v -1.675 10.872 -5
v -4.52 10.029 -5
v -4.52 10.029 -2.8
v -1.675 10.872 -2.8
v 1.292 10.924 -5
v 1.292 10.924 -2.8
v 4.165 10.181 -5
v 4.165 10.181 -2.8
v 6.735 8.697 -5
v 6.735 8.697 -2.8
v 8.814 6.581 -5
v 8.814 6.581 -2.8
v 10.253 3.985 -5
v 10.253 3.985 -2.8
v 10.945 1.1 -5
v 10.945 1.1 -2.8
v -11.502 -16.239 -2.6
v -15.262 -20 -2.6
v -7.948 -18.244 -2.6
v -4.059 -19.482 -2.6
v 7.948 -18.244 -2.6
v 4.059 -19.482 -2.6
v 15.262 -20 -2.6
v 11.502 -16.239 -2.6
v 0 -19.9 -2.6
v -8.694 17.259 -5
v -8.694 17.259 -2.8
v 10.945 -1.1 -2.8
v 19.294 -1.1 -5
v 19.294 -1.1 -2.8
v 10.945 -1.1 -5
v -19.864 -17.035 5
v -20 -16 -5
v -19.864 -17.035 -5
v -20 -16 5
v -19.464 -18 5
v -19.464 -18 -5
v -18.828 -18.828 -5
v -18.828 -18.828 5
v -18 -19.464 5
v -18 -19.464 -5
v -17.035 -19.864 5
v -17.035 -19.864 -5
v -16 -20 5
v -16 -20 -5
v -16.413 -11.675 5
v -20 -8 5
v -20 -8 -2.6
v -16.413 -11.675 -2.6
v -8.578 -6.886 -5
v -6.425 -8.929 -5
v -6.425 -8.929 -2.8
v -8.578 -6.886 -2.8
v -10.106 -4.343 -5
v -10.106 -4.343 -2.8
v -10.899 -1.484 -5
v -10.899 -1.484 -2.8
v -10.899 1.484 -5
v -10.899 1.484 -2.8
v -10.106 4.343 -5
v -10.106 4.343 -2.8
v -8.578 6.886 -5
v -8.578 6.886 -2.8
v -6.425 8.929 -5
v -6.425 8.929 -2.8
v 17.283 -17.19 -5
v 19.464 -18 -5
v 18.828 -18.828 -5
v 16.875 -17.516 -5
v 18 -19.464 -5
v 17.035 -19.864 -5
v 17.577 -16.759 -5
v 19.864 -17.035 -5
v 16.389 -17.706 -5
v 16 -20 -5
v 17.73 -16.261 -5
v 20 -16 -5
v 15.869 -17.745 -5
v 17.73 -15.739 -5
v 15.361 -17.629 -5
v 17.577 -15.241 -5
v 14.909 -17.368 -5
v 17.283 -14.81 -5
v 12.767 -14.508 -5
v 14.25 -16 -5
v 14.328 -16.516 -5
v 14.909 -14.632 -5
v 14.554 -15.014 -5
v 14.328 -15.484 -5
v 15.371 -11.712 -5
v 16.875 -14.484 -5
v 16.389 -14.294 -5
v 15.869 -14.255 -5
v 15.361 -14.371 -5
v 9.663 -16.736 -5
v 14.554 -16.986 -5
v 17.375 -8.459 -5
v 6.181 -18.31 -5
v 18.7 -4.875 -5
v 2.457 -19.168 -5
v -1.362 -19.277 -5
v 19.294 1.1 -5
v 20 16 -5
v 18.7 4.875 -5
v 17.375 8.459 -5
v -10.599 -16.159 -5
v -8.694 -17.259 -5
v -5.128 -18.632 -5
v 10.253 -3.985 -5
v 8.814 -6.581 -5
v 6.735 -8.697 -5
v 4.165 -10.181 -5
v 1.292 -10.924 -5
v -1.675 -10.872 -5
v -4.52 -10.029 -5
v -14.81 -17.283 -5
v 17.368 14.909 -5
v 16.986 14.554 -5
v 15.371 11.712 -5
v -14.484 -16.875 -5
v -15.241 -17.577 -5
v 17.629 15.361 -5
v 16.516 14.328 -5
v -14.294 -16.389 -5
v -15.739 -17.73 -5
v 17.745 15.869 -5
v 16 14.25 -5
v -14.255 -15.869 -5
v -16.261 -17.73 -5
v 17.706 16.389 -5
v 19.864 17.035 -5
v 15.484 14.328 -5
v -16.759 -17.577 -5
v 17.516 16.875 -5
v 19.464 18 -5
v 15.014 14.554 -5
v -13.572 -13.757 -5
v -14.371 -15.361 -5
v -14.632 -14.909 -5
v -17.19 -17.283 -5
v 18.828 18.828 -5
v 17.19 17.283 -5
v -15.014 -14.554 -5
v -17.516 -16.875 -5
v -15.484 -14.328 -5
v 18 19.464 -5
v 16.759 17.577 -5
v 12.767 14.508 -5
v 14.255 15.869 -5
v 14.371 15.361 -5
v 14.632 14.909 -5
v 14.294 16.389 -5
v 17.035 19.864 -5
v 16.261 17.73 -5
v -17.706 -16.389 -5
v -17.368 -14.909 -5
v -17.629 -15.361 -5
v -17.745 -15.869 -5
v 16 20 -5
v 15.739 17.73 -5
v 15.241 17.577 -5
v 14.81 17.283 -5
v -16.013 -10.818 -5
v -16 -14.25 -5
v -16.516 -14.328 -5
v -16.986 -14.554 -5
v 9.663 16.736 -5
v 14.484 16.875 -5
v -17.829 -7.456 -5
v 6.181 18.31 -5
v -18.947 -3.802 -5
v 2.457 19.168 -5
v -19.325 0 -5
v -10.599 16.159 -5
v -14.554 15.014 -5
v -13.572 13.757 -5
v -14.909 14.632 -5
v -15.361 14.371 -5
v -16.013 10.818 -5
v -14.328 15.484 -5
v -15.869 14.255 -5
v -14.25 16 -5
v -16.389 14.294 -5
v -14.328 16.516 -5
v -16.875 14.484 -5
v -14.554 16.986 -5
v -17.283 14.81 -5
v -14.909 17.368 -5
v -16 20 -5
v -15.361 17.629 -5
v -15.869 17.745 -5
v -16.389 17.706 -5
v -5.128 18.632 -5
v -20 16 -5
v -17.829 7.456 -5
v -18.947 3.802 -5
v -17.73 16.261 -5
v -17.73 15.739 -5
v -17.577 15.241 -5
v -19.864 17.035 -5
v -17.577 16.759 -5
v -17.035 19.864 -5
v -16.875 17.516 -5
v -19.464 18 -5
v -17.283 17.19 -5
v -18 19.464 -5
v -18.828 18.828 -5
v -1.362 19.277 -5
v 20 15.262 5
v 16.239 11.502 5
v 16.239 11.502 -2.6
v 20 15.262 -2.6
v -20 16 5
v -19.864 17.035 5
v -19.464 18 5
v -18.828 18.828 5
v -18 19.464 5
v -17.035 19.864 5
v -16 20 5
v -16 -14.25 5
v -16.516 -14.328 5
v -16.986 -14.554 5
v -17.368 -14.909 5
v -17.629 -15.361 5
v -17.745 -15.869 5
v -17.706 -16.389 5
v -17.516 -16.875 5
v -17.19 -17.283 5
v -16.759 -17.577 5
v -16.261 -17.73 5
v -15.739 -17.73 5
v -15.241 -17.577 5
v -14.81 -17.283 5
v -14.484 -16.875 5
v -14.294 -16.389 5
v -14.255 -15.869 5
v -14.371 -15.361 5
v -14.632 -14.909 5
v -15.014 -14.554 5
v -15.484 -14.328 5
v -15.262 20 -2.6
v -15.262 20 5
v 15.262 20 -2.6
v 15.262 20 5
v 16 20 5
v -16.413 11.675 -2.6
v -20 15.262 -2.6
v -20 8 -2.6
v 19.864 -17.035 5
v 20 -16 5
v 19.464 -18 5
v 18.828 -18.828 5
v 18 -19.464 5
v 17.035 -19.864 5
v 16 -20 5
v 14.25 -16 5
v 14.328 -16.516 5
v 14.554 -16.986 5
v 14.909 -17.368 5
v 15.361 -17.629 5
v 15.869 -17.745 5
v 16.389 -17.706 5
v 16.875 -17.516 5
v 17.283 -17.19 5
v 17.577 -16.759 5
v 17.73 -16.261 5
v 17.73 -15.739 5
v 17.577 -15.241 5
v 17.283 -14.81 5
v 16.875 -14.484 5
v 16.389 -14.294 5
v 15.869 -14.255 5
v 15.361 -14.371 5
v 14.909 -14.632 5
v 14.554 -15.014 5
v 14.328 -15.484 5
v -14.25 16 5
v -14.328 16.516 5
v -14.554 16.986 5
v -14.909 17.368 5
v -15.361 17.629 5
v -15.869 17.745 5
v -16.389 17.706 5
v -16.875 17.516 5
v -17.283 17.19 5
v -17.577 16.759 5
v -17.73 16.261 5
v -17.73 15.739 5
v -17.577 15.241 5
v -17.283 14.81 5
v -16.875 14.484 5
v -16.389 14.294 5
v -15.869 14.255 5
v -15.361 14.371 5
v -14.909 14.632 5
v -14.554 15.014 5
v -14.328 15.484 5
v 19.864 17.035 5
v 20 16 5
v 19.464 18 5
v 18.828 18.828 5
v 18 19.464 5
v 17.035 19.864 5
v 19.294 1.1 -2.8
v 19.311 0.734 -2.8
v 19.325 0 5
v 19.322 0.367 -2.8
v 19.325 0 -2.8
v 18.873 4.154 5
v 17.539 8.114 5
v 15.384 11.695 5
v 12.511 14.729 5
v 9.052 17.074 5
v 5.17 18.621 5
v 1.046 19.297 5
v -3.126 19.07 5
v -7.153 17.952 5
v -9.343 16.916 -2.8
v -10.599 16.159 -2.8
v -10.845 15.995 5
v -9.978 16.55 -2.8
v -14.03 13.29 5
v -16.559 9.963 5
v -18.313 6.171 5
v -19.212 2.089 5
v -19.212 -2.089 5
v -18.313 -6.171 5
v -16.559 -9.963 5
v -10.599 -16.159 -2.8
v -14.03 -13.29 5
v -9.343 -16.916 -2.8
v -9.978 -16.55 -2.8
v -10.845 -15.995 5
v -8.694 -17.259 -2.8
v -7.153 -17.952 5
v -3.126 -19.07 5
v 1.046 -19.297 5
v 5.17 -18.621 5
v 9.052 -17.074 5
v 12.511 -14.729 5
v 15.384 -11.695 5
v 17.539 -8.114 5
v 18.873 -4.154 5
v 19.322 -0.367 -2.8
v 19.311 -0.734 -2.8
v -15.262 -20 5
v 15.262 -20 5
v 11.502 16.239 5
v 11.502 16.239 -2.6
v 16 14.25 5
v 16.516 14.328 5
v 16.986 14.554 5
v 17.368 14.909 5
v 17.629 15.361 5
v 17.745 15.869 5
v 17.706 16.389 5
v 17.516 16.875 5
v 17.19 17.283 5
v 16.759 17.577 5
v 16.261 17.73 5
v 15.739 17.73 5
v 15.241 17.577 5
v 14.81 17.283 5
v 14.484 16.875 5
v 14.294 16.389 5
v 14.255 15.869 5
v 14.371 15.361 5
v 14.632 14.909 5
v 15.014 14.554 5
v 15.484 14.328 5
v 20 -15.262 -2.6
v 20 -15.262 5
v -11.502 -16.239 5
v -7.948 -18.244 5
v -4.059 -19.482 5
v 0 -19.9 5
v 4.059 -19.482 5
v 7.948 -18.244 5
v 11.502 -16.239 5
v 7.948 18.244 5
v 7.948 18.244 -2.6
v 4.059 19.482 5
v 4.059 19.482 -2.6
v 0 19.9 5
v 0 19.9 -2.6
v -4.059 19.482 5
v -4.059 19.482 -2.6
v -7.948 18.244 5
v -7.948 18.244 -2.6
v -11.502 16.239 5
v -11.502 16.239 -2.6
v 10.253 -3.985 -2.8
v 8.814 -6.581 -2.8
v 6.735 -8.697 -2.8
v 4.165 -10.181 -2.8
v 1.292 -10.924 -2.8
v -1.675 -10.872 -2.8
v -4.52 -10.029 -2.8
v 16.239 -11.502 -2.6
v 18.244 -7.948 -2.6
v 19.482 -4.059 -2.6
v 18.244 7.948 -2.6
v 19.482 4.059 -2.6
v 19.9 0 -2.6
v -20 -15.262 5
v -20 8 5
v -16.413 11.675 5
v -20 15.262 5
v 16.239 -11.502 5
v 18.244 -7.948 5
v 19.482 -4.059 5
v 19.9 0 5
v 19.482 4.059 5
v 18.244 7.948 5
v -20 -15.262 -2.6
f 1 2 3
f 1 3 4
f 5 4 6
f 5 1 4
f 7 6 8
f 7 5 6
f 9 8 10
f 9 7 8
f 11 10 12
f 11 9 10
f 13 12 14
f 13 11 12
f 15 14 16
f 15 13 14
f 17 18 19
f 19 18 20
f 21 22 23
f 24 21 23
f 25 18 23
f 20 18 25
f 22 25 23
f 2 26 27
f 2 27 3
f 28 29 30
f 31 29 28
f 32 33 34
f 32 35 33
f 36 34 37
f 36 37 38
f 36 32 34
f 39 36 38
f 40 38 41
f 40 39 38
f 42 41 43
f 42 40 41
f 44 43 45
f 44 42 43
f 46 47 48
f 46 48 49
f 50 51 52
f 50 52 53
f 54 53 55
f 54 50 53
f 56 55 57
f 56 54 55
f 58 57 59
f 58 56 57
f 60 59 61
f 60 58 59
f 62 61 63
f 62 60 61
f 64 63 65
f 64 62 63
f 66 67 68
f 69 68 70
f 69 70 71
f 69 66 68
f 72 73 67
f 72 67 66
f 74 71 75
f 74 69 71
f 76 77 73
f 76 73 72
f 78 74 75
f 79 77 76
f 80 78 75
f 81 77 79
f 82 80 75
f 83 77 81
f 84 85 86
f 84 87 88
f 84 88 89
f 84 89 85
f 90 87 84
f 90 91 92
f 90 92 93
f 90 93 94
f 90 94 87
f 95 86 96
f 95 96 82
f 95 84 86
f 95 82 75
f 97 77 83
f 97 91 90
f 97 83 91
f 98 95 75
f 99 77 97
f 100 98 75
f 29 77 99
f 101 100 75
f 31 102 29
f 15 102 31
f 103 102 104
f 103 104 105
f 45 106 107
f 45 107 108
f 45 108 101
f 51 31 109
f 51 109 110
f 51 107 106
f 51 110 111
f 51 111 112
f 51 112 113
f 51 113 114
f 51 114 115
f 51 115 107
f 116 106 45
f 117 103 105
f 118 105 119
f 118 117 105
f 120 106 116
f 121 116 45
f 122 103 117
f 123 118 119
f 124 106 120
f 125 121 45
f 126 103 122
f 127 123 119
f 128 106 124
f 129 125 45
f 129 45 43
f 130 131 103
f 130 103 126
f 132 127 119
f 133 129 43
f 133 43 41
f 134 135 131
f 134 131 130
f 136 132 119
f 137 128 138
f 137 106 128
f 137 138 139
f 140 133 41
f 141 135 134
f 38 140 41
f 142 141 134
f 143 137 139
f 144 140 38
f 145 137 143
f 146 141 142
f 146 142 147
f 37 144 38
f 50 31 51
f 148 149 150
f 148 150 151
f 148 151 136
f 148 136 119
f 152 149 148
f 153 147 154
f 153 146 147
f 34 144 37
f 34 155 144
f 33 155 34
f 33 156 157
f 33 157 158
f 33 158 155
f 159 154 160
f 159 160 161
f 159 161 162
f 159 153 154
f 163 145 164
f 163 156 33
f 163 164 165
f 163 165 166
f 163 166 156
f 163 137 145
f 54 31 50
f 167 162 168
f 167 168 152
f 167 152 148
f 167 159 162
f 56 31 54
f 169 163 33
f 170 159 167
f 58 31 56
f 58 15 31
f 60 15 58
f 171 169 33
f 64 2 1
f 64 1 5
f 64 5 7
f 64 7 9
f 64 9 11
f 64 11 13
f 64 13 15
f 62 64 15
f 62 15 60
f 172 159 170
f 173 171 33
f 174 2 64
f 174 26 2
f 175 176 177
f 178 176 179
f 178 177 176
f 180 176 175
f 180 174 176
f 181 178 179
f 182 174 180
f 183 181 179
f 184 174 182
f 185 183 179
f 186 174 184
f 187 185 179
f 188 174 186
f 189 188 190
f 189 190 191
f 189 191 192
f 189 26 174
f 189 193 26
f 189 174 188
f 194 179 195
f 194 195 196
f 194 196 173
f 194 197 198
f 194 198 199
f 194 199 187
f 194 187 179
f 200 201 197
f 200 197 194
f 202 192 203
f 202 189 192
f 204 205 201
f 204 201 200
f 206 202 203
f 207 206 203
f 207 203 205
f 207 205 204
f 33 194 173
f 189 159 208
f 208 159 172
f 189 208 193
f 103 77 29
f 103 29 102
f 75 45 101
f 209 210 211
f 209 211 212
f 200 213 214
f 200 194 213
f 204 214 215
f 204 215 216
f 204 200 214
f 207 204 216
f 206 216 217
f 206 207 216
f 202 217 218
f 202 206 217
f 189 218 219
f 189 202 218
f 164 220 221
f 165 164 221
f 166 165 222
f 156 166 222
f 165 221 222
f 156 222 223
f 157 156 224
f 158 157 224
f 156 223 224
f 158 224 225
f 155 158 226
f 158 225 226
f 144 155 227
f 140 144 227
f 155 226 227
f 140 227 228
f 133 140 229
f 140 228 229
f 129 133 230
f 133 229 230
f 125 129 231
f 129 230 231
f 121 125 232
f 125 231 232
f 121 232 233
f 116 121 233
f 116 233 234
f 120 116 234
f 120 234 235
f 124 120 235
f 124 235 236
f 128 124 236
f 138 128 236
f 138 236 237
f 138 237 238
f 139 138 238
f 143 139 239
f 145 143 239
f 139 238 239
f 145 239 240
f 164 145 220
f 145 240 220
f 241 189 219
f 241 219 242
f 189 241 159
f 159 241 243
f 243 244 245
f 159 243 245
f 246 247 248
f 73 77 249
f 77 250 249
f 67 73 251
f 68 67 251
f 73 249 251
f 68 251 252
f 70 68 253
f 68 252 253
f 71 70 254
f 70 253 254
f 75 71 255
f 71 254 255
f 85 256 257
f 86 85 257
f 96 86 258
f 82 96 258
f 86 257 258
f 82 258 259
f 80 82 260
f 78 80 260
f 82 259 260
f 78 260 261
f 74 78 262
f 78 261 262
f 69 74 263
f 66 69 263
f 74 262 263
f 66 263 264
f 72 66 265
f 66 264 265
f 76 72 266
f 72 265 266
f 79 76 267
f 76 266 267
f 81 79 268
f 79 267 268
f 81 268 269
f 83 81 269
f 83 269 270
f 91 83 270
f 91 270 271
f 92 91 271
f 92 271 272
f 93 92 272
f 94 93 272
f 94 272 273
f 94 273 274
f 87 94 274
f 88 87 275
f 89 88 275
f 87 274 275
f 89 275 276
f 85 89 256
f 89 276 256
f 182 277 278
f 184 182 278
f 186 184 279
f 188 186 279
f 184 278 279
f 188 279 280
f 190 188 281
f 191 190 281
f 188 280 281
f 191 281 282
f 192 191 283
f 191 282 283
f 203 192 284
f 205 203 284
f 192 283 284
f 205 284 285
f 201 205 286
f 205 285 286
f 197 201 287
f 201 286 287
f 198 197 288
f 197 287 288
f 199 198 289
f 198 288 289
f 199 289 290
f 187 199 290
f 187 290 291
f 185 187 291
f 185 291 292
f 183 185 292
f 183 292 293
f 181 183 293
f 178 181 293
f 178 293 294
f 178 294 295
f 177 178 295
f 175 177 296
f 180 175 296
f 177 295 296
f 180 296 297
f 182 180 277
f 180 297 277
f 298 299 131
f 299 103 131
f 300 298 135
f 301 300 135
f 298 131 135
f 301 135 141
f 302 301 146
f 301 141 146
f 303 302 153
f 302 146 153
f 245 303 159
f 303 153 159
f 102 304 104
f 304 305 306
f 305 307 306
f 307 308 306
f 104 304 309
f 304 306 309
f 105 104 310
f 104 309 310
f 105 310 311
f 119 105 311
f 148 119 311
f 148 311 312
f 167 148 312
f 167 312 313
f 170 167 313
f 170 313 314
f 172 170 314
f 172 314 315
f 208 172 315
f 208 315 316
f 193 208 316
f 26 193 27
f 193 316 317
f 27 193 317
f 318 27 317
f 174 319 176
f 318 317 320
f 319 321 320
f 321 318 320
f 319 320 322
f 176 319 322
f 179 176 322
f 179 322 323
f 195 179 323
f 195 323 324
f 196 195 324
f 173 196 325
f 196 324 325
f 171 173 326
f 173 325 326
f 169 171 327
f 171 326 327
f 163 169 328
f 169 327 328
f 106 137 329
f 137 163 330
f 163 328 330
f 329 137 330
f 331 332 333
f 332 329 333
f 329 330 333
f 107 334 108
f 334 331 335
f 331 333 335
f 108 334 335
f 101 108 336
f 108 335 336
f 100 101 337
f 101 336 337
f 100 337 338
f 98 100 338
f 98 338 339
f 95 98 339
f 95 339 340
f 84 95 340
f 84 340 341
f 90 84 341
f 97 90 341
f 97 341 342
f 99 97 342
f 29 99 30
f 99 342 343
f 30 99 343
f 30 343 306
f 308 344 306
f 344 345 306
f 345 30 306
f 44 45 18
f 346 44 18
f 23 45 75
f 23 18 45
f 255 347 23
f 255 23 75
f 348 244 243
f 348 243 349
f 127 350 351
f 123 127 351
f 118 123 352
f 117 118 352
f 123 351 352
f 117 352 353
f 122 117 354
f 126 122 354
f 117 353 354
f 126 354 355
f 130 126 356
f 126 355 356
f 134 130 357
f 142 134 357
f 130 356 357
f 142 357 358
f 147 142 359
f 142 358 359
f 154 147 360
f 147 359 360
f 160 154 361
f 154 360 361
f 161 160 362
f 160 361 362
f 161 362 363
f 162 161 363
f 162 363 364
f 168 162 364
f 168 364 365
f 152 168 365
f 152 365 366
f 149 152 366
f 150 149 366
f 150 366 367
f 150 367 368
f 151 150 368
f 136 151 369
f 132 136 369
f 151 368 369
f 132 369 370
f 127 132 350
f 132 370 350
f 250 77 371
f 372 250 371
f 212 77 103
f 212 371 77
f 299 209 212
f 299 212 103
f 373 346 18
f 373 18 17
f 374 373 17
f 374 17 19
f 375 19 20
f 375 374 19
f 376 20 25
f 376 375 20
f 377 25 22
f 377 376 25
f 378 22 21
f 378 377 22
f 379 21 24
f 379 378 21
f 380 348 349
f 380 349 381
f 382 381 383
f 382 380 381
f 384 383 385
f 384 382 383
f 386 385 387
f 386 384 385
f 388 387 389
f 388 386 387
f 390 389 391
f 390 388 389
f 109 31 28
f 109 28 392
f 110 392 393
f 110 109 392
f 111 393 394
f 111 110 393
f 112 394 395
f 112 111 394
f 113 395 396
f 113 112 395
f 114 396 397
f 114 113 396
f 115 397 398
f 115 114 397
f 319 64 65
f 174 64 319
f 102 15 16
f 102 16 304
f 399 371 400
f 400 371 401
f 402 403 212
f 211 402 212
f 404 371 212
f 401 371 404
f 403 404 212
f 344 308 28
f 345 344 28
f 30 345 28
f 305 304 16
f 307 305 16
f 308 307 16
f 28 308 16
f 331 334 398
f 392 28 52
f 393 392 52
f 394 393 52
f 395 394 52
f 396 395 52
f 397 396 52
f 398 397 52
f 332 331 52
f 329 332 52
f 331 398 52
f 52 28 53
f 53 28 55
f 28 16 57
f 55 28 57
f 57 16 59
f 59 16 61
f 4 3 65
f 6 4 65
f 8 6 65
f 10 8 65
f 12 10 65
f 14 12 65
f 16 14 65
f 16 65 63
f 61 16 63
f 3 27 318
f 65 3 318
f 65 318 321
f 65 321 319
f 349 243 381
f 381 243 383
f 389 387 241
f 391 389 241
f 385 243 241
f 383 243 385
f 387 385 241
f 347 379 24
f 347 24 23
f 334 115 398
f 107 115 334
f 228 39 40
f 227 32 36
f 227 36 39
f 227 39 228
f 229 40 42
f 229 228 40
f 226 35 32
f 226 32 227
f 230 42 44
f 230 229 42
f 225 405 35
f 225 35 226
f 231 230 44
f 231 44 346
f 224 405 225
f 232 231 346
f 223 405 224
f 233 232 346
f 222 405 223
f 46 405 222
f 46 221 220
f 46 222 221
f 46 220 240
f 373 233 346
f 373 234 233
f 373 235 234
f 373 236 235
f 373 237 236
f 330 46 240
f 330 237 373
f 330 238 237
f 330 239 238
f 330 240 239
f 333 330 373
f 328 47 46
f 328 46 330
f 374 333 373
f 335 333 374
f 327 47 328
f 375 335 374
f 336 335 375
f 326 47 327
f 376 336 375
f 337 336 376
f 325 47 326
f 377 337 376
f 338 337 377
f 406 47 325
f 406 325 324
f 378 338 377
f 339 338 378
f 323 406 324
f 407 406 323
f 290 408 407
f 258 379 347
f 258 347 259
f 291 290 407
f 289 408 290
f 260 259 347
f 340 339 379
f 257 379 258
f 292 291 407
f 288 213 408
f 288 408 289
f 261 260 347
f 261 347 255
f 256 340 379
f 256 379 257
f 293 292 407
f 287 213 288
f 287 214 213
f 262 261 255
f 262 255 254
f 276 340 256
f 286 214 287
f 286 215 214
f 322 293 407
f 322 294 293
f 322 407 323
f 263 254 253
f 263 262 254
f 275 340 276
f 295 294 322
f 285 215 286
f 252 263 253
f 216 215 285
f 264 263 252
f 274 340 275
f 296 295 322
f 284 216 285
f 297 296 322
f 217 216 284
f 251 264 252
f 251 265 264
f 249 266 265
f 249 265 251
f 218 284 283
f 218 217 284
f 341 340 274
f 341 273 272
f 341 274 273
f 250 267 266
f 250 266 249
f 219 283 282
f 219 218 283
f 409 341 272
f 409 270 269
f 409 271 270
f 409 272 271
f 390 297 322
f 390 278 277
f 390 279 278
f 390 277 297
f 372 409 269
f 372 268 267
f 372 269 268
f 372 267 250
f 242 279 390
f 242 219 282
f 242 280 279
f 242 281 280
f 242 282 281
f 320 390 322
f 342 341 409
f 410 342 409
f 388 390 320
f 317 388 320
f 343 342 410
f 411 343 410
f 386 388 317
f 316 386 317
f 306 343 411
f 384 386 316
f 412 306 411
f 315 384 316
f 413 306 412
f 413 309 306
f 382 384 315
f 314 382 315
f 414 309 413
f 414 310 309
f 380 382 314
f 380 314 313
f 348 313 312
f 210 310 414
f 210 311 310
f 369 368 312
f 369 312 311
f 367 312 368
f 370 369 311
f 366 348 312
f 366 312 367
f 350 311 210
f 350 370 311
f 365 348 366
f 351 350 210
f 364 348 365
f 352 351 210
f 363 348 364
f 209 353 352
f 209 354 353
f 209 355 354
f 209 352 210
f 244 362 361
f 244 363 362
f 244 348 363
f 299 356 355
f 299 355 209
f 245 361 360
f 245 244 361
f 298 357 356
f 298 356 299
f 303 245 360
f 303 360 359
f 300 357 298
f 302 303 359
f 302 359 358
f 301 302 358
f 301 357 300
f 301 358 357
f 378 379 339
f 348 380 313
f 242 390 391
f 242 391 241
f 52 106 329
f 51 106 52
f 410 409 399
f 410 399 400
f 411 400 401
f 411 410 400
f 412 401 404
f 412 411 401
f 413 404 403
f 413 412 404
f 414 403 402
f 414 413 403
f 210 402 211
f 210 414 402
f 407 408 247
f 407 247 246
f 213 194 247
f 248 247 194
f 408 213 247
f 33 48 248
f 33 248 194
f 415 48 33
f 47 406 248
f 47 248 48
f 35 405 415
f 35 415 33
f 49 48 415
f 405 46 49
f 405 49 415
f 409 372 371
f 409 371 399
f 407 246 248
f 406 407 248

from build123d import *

# Parameters (mm, degrees)
SKETCH21_W          = 40
SKETCH21_H          = 40
BOSS_EXTRUDE4_DEPTH = 5
FILLET3_R           = 4
SKETCH22_R          = 19.325
CUT_EXTRUDE11_DEPTH = 11
CUT_EXTRUDE12_DEPTH = 7.6
SKETCH30_R          = 1.75
CUT_EXTRUDE13_DEPTH = 10
CIRPATTERN2_COUNT   = 4
BOSS_EXTRUDE3_DEPTH = 2.2
BOSS_EXTRUDE5_REACH = 12


with BuildPart() as part:
    # Sketch21 → Boss-Extrude4 (new body, symmetric)
    with BuildSketch(Plane.XY):
        Rectangle(SKETCH21_W, SKETCH21_H)
    extrude(amount=BOSS_EXTRUDE4_DEPTH, both=True)

    # Fillet3
    fillet3_edges = [part.edges().sort_by_distance(p)[0] for p in [
        (20, -20, 0),
        (-20, -20, 0),
        (-20, 20, 0),
        (20, 20, 0),
    ]]
    fillet(fillet3_edges, radius=FILLET3_R)

    # Sketch22 → Cut-Extrude11 (cut, through all)
    with BuildSketch(Plane.XY.offset(5)):
        Circle(SKETCH22_R)
    extrude(amount=-CUT_EXTRUDE11_DEPTH, mode=Mode.SUBTRACT)

    # Sketch23 → Cut-Extrude12 (cut)
    with BuildSketch(Plane.XY.offset(5)):
        with BuildLine():
            Line((15.262384566, 20), (11.501799696, 16.23941513))
            ThreePointArc((11.501799696, 16.23941513), (0, 19.9), (-11.501799696, 16.23941513))
            Line((-11.501799696, 16.23941513), (-15.262384566, 20))
            Line((-15.262384566, 20), (15.262384566, 20))
        make_face()
    cut_extrude12 = extrude(amount=-CUT_EXTRUDE12_DEPTH, mode=Mode.SUBTRACT)

    # Sketch30 → Cut-Extrude13 (cut)
    with BuildSketch(Plane.XY.offset(5)):
        with Locations((-16, 16)):
            Circle(SKETCH30_R)
    cut_extrude13 = extrude(amount=-CUT_EXTRUDE13_DEPTH, mode=Mode.SUBTRACT)

    # CirPattern2: Cut-Extrude12, Cut-Extrude13 ×4 about axis
    cirpattern2_axis = Axis((0, 0, 0), (0, 0, 1))
    for i in range(1, CIRPATTERN2_COUNT):
        add(cut_extrude12.rotate(cirpattern2_axis, i * 360 / CIRPATTERN2_COUNT), mode=Mode.SUBTRACT)
        add(cut_extrude13.rotate(cirpattern2_axis, i * 360 / CIRPATTERN2_COUNT), mode=Mode.SUBTRACT)

    # Sketch20 → Boss-Extrude3 (add)
    with BuildSketch(Plane(origin=(0, 0, -5), x_dir=(-1, 0, 0), z_dir=(0, 0, -1))):
        with BuildLine():
            Line((6.425058848, 8.928528367), (10.599461946, 16.158806623))
            ThreePointArc((10.599461946, 16.158806623), (9.6625, 16.735940928), (8.694206057, 17.258806623))
            Line((8.694206057, 17.258806623), (4.51980296, 10.028528367))
            ThreePointArc((4.51980296, 10.028528367), (-5.5, 9.526279442), (-10.944861808, 1.1))
            Line((-10.944861808, 1.1), (-19.293668003, 1.1))
            ThreePointArc((-19.293668003, 1.1), (-19.325, 0), (-19.293668003, -1.1))
            Line((-19.293668003, -1.1), (-10.944861808, -1.1))
            ThreePointArc((-10.944861808, -1.1), (-5.5, -9.526279442), (4.51980296, -10.028528367))
            Line((4.51980296, -10.028528367), (8.694206057, -17.258806623))
            ThreePointArc((8.694206057, -17.258806623), (9.6625, -16.735940928), (10.599461946, -16.158806623))
            Line((10.599461946, -16.158806623), (6.425058848, -8.928528367))
            ThreePointArc((6.425058848, -8.928528367), (11, 0), (6.425058848, 8.928528367))
        make_face()
    extrude(amount=-BOSS_EXTRUDE3_DEPTH)

    # Sketch31 → Boss-Extrude5 (add, up to next)
    with BuildSketch(Plane.XY.offset(5), mode=Mode.PRIVATE) as boss_extrude5_sk1:
        with BuildLine():
            Line((-14.240301081, 13.900497298), (-20, 8))
            Line((-20, 8), (-20, -8))
            Line((-20, -8), (-14.240301081, -13.900497298))
            ThreePointArc((-14.240301081, -13.900497298), (-19.9, 0), (-14.240301081, 13.900497298))
        make_face()
    boss_extrude5_tool1 = extrude(boss_extrude5_sk1.sketch, amount=-BOSS_EXTRUDE5_REACH, mode=Mode.PRIVATE) - part.part
    add(boss_extrude5_tool1.solids().sort_by_distance((-19.928391, 0, 5))[0])


solid = part.part
